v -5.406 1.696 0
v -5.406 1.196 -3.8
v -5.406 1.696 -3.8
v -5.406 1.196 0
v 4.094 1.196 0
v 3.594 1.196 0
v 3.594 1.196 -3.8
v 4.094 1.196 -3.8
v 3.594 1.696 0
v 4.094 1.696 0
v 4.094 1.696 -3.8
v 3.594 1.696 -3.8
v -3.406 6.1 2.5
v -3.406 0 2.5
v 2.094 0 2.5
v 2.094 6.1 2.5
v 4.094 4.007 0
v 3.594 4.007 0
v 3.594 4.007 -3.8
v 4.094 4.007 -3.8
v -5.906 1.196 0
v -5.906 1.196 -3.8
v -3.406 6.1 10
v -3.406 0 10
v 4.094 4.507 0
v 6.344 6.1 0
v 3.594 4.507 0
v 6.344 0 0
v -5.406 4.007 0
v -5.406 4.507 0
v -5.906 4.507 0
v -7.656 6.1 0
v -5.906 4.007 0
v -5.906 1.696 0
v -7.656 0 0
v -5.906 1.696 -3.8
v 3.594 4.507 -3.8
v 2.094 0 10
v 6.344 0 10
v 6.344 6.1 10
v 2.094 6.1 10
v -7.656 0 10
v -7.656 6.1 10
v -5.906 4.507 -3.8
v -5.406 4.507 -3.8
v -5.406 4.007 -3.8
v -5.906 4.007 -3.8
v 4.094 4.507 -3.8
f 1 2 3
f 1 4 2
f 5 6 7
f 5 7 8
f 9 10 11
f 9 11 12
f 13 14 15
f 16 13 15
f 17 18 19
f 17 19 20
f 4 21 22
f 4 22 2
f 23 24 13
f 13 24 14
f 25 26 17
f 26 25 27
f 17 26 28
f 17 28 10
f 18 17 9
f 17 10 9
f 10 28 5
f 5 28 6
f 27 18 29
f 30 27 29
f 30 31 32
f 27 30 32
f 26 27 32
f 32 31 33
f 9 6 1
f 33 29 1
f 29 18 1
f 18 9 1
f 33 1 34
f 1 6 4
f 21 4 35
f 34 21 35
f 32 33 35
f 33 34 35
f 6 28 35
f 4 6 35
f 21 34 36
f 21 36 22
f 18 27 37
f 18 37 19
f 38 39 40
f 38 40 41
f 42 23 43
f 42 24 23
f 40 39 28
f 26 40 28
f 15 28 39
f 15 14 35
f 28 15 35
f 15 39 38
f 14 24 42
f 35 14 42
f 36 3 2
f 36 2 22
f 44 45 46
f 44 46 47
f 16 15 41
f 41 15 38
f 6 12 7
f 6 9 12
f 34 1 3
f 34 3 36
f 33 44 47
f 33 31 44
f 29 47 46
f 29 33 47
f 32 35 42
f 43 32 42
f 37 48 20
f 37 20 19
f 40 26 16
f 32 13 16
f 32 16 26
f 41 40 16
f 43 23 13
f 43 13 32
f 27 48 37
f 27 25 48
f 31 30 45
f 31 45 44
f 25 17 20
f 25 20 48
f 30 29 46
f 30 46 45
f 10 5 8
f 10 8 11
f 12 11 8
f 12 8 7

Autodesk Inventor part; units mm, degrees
ref_plane "YZ Plane" through (0, 0, 0) normal (1, 0, 0) x (0, 1, 0)
ref_plane "XZ Plane" through (0, 0, 0) normal (0, 1, 0) x (-1, 0, 0)
ref_plane "XY Plane" through (0, 0, 0) normal (0, 0, 1) x (1, 0, 0)
sketch "Sketch1" plane through (0, 0, 0) normal (0, 1, 0) x (-1, 0, 0)
  line L0 (-6.3436, 0) -> (7.6564, 0)
  line L1 (7.6564, 0) -> (7.6564, 10)
  line L2 (3.4064, 10) -> (3.4064, 2.5)
  line L3 (3.4064, 2.5) -> (-2.0936, 2.5)
  line L4 (-2.0936, 2.5) -> (-2.0936, 10)
  line L5 (-6.3436, 10) -> (-6.3436, 0)
  line L6 (-6.3436, 10) -> (-2.0936, 10)
  line L7 (3.4064, 10) -> (7.6564, 10)
  point P0 (0, 0)
  dimension "d0" = 10
  dimension "d2" = 14
  dimension "d3" = 2.5
  dimension "d24" = 4.25
  dimension "d25" = 4.25
extrude "Extrusion1" add sketch "Sketch1" along normal blind 6.1
sketch "Sketch2" plane through (6.3436, 0, 0) normal (0, 0, -1) x (-1, 0, 0)
  line L0 (0, 0) -> (0, 6.1) projected
  line L1 (2.25, 4.5071) -> (2.75, 4.5071)
  line L2 (2.75, 4.5071) -> (2.75, 4.0071)
  line L3 (2.75, 4.0071) -> (2.25, 4.0071)
  line L4 (2.25, 4.0071) -> (2.25, 4.5071)
  line L5 (2.25, 1.6957) -> (2.75, 1.6957)
  line L6 (2.75, 1.6957) -> (2.75, 1.1957)
  line L7 (2.75, 1.1957) -> (2.25, 1.1957)
  line L8 (2.25, 1.1957) -> (2.25, 1.6957)
  line L9 (11.75, 4.5071) -> (12.25, 4.5071)
  line L10 (12.25, 4.5071) -> (12.25, 4.0071)
  line L11 (11.75, 4.0071) -> (11.75, 4.5071)
  line L12 (12.25, 4.0071) -> (11.75, 4.0071)
  line L13 (11.75, 1.6957) -> (12.25, 1.6957)
  line L14 (12.25, 1.6957) -> (12.25, 1.1957)
  line L15 (11.75, 1.1957) -> (11.75, 1.6957)
  line L16 (12.25, 1.1957) -> (11.75, 1.1957)
  point P0 (6.3436, 0)
  dimension "d6" = 0.5
  dimension "d10" = 0.5
  dimension "d11" = 0.5
  dimension "d12" = 0.5
  dimension "d13" = 0.5
  dimension "d14" = 0.5
  dimension "d15" = 0.5
  dimension "d16" = 0.5
  dimension "d17" = 2.3114
  dimension "d18" = 9
  dimension "d19" = 2.25
extrude "Extrusion2" add sketch "Sketch2" along normal blind 3.8
properties part number "tacometer_ct" material "ABS Plastic"
